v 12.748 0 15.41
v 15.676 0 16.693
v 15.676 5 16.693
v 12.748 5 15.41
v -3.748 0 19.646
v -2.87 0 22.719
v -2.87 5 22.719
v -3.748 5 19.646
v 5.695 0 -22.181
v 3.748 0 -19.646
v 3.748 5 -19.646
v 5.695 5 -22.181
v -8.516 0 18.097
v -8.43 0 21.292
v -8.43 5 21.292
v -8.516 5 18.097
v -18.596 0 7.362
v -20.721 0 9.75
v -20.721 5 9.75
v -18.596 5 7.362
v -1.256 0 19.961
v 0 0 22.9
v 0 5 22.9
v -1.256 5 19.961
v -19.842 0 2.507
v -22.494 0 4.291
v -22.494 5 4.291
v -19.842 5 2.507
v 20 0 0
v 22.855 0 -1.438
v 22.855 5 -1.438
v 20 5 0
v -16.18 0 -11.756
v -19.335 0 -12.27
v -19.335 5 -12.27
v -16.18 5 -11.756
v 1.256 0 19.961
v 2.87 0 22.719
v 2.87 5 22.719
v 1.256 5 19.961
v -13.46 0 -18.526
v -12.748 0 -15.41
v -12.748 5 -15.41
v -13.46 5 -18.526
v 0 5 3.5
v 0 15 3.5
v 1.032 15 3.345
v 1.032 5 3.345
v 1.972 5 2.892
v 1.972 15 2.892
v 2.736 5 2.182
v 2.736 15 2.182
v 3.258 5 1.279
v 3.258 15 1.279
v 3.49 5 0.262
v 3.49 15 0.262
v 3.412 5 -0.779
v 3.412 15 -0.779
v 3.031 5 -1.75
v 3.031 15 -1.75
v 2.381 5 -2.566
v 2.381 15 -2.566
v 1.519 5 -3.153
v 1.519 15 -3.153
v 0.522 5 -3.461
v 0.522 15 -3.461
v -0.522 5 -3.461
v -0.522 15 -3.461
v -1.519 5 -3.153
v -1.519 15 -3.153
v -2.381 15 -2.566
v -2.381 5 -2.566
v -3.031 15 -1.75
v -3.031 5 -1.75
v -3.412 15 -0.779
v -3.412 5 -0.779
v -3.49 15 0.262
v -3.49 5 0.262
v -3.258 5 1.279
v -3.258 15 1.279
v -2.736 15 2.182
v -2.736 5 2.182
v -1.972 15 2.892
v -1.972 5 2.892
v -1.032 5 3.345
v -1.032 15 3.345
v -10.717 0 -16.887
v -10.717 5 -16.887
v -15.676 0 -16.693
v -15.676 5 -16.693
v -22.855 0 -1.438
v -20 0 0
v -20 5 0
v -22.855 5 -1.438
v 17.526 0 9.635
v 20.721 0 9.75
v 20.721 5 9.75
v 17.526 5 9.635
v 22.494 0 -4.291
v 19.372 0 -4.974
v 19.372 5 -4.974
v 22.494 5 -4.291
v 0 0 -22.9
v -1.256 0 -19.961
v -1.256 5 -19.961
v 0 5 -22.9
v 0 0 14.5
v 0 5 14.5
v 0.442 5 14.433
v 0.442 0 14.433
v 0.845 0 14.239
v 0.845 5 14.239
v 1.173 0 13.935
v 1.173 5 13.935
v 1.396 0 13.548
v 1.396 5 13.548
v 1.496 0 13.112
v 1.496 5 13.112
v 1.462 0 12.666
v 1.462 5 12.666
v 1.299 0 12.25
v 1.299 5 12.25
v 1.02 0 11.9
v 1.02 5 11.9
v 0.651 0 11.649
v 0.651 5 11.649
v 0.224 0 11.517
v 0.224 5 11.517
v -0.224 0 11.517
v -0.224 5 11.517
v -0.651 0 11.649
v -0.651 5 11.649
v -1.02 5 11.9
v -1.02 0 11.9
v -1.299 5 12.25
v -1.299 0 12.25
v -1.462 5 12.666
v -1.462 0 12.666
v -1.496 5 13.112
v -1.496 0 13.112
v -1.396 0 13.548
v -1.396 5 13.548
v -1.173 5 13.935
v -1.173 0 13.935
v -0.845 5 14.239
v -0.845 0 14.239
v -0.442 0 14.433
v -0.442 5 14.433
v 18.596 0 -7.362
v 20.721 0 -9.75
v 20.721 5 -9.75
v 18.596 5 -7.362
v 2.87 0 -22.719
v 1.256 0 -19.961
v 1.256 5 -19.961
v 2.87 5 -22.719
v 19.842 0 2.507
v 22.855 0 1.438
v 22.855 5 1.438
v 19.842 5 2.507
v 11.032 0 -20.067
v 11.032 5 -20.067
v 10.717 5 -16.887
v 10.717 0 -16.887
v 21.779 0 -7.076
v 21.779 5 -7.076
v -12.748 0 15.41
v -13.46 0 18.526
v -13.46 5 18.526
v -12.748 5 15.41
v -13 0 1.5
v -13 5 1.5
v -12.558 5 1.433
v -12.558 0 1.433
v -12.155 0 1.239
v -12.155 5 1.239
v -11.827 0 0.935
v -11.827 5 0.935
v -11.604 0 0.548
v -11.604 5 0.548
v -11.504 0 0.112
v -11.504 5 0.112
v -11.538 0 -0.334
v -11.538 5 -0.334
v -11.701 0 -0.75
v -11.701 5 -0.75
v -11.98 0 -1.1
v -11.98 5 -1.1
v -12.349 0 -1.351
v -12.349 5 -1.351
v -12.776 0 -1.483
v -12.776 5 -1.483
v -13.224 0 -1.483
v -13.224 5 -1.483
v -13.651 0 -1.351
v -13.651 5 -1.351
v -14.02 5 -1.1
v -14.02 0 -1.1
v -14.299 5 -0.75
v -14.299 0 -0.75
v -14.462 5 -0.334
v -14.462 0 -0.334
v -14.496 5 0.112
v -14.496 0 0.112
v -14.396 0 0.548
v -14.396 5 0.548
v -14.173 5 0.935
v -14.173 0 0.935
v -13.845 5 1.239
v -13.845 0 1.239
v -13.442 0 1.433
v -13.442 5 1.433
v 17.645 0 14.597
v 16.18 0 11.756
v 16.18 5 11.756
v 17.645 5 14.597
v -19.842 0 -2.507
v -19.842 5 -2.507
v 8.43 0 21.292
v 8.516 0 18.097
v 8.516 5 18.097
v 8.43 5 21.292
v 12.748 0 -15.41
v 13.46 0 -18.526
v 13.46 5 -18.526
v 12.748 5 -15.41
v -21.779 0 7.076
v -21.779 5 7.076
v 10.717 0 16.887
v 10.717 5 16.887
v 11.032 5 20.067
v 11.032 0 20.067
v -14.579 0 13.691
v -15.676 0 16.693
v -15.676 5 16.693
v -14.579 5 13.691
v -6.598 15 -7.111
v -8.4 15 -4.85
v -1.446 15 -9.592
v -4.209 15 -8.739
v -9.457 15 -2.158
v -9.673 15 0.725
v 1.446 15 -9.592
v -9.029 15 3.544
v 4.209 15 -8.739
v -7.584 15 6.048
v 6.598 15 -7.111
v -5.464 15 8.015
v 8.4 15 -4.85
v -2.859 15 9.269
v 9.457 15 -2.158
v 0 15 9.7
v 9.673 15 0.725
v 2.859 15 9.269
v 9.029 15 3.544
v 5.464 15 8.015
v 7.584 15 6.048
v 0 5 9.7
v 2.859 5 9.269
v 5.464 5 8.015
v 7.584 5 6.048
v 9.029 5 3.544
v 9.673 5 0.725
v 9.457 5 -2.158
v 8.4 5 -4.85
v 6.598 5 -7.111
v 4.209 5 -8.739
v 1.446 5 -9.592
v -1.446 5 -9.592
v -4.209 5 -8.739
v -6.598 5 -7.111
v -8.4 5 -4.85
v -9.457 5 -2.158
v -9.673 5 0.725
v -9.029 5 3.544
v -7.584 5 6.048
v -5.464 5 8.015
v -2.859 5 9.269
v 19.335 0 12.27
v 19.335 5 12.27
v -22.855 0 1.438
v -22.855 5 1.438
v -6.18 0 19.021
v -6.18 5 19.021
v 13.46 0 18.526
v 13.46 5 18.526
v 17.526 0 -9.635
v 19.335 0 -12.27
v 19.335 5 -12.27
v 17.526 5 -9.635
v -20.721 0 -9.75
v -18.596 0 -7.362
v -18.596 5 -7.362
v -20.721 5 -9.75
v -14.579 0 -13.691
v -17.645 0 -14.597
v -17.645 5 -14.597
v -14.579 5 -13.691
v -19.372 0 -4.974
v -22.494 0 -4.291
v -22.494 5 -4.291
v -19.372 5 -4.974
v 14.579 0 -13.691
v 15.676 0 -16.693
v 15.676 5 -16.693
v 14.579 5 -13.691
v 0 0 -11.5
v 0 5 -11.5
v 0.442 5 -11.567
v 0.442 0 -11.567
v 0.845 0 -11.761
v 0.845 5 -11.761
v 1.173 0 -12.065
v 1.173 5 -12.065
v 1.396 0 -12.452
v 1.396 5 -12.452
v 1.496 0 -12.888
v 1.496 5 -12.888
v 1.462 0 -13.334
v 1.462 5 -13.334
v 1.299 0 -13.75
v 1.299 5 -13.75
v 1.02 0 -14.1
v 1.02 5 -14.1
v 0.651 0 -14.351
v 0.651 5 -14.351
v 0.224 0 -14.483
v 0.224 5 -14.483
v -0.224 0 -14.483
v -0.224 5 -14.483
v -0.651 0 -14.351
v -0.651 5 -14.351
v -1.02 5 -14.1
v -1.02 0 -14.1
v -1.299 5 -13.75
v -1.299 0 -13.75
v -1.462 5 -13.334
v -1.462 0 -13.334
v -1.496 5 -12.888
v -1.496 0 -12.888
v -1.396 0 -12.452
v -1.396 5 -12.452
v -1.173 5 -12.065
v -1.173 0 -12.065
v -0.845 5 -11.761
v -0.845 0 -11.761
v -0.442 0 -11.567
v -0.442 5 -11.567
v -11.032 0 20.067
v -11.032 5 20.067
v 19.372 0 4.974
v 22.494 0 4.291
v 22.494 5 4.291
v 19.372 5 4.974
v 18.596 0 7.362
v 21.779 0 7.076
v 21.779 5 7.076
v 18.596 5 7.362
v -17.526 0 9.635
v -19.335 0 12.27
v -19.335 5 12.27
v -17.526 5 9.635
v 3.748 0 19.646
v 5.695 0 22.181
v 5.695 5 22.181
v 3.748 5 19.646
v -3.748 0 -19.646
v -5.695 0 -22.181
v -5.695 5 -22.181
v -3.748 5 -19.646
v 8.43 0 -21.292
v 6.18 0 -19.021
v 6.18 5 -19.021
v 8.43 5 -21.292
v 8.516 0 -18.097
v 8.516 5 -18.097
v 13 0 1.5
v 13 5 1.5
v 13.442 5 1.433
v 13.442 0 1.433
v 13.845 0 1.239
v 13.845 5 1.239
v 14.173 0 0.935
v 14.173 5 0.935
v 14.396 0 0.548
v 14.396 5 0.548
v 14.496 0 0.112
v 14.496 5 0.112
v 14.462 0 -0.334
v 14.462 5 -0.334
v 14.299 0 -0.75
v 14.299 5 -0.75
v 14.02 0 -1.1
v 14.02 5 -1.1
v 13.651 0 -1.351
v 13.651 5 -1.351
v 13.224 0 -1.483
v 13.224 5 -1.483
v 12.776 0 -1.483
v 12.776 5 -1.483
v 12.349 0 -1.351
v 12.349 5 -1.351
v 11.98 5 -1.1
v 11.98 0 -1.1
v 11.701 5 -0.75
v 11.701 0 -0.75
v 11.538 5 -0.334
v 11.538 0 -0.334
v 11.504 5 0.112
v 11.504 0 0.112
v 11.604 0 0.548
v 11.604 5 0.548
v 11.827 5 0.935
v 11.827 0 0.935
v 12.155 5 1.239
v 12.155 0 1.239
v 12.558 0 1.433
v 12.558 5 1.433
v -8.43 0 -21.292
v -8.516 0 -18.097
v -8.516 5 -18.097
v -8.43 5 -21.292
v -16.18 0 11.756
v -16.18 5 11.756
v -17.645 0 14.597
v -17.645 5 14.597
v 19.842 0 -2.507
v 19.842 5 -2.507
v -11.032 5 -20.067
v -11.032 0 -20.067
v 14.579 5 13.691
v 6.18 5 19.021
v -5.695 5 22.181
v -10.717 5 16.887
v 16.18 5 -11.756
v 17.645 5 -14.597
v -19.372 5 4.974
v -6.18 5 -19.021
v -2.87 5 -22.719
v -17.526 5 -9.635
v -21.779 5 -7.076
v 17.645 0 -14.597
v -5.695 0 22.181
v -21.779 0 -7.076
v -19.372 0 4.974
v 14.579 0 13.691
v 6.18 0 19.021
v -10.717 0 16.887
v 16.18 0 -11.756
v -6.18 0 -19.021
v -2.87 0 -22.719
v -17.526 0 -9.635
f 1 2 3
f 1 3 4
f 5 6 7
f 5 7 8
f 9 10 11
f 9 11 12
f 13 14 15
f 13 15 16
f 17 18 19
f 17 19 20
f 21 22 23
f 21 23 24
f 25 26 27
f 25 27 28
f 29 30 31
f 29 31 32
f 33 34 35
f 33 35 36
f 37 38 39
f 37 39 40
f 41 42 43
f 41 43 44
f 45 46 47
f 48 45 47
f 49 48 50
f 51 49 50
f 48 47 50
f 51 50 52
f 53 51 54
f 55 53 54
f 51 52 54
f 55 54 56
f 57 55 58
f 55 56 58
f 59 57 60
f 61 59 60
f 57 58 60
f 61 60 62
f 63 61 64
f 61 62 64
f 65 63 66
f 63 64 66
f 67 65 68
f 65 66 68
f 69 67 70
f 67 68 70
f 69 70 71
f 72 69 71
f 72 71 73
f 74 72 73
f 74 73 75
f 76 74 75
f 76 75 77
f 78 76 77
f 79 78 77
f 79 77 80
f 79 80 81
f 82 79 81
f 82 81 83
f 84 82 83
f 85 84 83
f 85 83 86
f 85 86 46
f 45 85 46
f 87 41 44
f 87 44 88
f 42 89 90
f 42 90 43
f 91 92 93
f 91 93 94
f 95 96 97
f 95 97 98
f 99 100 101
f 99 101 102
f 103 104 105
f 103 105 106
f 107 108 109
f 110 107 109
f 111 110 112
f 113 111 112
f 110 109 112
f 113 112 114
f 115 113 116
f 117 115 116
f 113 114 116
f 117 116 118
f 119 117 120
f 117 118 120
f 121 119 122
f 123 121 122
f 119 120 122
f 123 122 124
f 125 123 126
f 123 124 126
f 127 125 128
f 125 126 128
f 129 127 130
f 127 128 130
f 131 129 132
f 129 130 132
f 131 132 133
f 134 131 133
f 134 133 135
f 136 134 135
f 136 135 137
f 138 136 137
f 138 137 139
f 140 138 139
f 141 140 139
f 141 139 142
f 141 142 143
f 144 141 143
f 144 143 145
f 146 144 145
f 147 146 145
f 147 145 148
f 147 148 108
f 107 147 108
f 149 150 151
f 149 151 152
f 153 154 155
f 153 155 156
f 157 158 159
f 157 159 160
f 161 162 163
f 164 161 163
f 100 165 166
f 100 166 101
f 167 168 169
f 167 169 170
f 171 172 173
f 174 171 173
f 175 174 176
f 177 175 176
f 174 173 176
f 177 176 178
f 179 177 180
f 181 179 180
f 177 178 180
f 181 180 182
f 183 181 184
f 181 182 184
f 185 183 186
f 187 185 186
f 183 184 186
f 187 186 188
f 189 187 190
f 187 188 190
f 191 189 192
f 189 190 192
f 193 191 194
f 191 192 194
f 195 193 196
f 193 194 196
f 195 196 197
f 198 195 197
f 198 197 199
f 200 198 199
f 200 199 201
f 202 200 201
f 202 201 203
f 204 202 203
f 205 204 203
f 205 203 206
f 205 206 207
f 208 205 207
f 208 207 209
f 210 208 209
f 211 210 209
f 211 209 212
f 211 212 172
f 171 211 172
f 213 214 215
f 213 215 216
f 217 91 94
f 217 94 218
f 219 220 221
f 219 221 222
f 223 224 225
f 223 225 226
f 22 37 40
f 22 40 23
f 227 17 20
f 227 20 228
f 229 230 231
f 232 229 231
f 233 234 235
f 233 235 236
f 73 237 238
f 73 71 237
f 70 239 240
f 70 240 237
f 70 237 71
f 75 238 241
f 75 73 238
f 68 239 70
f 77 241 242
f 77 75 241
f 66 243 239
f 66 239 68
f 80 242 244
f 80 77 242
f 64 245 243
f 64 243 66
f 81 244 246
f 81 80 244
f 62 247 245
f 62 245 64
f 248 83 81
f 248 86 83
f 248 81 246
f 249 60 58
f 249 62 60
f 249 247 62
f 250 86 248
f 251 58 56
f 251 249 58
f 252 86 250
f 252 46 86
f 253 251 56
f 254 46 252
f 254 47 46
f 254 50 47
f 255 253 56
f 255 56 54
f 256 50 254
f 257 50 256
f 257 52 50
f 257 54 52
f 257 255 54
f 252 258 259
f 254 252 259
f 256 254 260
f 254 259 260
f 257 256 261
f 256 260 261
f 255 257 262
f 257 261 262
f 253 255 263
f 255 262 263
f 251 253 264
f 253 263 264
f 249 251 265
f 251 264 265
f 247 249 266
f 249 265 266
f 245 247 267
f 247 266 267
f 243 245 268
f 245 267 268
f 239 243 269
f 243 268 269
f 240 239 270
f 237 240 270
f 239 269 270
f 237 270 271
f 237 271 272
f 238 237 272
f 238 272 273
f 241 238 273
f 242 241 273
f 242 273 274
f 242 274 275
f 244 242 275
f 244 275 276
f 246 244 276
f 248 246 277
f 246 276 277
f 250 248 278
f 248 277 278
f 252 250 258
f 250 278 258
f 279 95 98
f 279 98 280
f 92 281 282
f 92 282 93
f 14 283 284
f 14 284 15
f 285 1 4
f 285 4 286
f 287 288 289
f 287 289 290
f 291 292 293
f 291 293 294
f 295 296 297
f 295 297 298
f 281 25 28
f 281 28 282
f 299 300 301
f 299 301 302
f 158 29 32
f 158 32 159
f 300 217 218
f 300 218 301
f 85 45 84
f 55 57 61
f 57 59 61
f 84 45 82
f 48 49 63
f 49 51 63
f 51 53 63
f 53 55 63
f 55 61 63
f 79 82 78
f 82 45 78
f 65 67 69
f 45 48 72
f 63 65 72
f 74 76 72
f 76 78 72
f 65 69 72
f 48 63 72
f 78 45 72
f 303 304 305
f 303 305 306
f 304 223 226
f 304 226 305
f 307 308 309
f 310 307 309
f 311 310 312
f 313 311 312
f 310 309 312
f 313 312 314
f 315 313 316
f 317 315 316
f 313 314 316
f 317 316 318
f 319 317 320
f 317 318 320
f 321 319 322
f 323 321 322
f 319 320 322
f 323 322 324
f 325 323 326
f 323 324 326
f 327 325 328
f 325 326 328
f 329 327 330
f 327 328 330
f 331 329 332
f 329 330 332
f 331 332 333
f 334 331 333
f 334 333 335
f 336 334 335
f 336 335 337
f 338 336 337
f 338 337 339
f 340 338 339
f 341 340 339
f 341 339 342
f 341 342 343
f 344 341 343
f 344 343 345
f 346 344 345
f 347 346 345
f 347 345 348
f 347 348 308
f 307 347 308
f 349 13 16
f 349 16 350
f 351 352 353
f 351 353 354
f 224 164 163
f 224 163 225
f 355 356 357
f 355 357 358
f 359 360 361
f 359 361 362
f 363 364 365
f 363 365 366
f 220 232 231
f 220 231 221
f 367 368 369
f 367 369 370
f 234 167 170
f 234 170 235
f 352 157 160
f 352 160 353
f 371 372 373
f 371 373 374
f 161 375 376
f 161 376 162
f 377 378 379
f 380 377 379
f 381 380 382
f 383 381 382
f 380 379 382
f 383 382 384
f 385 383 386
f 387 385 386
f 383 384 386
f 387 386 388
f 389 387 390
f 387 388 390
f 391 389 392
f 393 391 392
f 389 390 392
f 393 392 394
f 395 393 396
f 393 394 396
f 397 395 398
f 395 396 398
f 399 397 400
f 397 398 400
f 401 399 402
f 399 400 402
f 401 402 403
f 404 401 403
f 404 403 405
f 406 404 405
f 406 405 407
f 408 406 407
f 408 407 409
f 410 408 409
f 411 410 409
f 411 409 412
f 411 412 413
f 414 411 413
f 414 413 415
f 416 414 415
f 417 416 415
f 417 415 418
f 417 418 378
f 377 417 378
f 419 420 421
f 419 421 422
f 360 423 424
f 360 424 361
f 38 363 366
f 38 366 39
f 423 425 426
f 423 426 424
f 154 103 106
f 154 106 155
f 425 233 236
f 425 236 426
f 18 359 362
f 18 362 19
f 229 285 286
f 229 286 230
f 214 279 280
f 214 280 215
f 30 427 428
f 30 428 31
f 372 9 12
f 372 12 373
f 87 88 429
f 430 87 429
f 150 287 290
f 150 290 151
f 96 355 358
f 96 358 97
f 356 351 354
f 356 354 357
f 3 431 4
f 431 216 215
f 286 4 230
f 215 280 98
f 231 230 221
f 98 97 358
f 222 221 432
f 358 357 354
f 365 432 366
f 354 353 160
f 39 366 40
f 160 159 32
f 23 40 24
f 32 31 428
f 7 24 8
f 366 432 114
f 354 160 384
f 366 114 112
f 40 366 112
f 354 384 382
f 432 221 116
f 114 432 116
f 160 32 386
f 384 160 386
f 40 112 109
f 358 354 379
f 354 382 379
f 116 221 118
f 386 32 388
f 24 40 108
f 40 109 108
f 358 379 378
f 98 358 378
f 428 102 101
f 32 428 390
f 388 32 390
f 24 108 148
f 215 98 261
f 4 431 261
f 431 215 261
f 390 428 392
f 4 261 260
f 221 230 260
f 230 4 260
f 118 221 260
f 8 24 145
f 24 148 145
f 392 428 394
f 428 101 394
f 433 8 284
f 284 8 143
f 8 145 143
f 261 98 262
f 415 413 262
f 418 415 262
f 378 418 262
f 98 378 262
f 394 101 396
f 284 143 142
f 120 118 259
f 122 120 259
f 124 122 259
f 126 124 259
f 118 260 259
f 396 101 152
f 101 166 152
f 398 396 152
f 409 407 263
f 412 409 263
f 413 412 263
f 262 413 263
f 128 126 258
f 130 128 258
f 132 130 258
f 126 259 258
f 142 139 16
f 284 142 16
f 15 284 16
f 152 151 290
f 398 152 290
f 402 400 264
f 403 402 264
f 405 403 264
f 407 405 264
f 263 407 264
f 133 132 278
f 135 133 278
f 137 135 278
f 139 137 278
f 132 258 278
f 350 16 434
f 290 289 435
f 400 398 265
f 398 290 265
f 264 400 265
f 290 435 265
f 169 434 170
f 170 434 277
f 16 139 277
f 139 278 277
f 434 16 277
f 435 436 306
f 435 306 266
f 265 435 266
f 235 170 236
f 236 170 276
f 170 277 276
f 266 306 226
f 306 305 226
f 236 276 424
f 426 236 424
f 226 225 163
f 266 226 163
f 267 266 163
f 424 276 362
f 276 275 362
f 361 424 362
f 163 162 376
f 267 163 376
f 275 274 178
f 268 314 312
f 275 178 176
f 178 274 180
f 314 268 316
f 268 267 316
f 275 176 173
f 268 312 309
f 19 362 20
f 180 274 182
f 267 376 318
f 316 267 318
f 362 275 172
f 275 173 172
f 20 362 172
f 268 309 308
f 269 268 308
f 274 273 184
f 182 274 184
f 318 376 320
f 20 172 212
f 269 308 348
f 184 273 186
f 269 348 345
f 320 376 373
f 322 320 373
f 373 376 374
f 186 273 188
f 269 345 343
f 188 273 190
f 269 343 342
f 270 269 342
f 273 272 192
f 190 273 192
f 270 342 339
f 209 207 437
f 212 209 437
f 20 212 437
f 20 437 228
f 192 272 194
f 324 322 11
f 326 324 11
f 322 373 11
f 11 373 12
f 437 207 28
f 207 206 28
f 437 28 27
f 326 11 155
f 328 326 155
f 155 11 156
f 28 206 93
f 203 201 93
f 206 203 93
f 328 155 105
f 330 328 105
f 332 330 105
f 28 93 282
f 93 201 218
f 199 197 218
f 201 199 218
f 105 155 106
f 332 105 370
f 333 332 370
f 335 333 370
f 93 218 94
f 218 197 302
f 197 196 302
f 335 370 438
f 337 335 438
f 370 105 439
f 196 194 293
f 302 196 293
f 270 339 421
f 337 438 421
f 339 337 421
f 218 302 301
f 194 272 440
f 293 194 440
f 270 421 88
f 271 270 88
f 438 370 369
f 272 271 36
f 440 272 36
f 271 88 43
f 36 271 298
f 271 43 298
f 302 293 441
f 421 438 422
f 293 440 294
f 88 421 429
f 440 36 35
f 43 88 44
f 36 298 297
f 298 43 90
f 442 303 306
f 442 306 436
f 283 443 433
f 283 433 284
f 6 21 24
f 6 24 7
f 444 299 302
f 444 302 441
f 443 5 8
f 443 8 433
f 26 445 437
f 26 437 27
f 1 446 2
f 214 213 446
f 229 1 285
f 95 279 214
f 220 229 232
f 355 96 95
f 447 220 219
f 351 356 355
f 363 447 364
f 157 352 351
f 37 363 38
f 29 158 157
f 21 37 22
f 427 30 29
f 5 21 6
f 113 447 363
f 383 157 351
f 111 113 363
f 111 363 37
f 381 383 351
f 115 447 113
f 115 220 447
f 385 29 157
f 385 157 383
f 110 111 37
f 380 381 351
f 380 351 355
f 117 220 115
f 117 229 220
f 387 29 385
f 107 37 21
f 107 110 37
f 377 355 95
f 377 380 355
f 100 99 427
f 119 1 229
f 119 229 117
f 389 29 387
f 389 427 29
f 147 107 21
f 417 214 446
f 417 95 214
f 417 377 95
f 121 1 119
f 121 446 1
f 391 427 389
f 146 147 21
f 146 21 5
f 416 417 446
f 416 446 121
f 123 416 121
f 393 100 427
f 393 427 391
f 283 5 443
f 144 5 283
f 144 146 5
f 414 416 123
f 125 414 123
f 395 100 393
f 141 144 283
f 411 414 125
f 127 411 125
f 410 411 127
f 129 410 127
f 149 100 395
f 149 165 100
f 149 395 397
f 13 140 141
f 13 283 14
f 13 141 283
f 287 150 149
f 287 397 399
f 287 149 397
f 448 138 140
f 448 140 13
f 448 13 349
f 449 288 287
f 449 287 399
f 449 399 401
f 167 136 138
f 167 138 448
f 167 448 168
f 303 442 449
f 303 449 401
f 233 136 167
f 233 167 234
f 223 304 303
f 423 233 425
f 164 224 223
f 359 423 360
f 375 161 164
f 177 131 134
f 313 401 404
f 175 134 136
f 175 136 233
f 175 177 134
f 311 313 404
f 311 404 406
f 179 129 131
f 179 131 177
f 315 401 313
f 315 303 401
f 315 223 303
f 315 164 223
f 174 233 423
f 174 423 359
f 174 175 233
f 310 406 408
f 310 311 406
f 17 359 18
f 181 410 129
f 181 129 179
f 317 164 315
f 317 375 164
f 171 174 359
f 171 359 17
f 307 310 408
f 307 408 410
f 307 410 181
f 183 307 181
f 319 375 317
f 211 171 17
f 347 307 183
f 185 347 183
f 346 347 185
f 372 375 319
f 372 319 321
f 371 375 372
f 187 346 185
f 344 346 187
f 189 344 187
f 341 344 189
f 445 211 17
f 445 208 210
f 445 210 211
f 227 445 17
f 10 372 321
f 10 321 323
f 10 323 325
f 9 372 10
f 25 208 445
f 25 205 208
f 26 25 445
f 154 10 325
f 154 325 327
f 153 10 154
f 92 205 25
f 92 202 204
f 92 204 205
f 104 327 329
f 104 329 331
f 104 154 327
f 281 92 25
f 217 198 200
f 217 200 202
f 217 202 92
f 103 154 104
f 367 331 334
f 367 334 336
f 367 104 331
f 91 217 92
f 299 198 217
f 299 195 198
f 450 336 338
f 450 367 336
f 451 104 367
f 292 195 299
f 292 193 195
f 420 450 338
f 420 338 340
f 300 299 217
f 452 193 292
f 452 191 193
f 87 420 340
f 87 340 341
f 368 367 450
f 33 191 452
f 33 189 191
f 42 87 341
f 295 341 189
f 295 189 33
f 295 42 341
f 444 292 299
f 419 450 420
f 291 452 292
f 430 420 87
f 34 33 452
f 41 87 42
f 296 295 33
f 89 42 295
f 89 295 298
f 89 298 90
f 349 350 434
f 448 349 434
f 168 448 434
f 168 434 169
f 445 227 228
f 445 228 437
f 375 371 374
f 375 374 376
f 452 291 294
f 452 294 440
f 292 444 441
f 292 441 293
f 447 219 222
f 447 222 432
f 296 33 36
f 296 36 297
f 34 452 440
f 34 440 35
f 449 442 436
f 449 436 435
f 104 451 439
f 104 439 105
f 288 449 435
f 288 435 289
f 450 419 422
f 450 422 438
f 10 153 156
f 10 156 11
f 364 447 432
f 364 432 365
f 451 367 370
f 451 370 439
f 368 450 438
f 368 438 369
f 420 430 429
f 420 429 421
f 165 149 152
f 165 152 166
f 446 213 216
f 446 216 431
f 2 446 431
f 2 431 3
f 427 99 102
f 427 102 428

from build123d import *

# Parameters (mm, degrees)
SKETCH_1_R          = 20
EXTRUDE_1_DEPTH     = 5
SKETCH_2_R          = 9.7
EXTRUDE_2_DEPTH     = 10
SKETCH_3_R          = 3.5
CUT_EXTRUDE_1_DEPTH = 15
SKETCH_6_R          = 1.5
CUT_EXTRUDE_2_DEPTH = 15
EXTRUDE_3_DEPTH     = 5
SKETCH_13_R         = 1.5
CUT_EXTRUDE_3_DEPTH = 36.661638146


with BuildPart() as part:
    # 草图1 → 凸台-拉伸1 (new body)
    with BuildSketch(Plane(origin=(0, 0, 0), x_dir=(1, 0, 0), z_dir=(0, 1, 0))):
        with Locations(Location((0, 0, 0), (0, 0, 270))):
            Circle(SKETCH_1_R)
    extrude(amount=EXTRUDE_1_DEPTH)

    # 草图2 → 凸台-拉伸2 (add)
    with BuildSketch(Plane(origin=(0, 5, 0), x_dir=(1, 0, 0), z_dir=(0, 1, 0))):
        with Locations(Location((0, 0, 0), (0, 0, 270))):
            Circle(SKETCH_2_R)
    extrude(amount=EXTRUDE_2_DEPTH)

    # 草图3 → 切除-拉伸1 (cut)
    with BuildSketch(Plane(origin=(0, 15, 0), x_dir=(1, 0, 0), z_dir=(0, 1, 0))):
        with Locations(Location((0, 0, 0), (0, 0, 270))):
            Circle(SKETCH_3_R)
    extrude(amount=-CUT_EXTRUDE_1_DEPTH, mode=Mode.SUBTRACT)

    # 草图6 → 切除-拉伸2 (cut)
    with BuildSketch(Plane(origin=(0, 5, 0), x_dir=(1, 0, 0), z_dir=(0, 1, 0))):
        with Locations(Location((-13, 0, 0), (0, 0, 270))):
            Circle(SKETCH_6_R)
        with Locations(Location((0, 13, 0), (0, 0, 270))):
            Circle(SKETCH_6_R)
        with Locations(Location((13, 0, 0), (0, 0, 270))):
            Circle(SKETCH_6_R)
        with Locations(Location((0, -13, 0), (0, 0, 270))):
            Circle(SKETCH_6_R)
    extrude(amount=-CUT_EXTRUDE_2_DEPTH, mode=Mode.SUBTRACT)

    # 草图12 → 凸台-拉伸3 (add)
    with BuildSketch(Plane(origin=(0, 0, 0), x_dir=(1, 0, 0), z_dir=(0, 1, 0))):
        Polygon((-1.255810391, 19.960534569), (0, 22.9), (1.255810391, 19.960534569), (2.870131049, 22.71942666), (3.747626292, 19.645745015), (5.694998416, 22.18055439), (6.180339887, 19.021130326), (8.430052256, 21.291881527), (8.515585831, 18.096541049), (11.032159137, 20.067422973), (10.7165359, 16.88655851), (13.460282277, 18.526489171), (12.748479795, 15.410264856), (15.676128726, 16.693381568), (14.579372548, 13.690942119), (17.64475326, 14.597009365), (16.180339887, 11.755705046), (19.335109494, 12.270433605), (17.526133601, 9.635073482), (20.720539501, 9.750345777), (18.595529718, 7.362491054), (21.779194223, 7.076489171), (19.371663223, 4.973797743), (22.494378042, 4.291032104), (19.842294026, 2.506664671), (22.854812081, 1.437902897), (20, 0), (22.854812081, -1.437902897), (19.842294026, -2.506664671), (22.494378042, -4.291032104), (19.371663223, -4.973797743), (21.779194223, -7.076489171), (18.595529718, -7.362491054), (20.720539501, -9.750345777), (17.526133601, -9.635073482), (19.335109494, -12.270433605), (16.180339887, -11.755705046), (17.64475326, -14.597009365), (14.579372548, -13.690942119), (15.676128726, -16.693381568), (12.748479795, -15.410264856), (13.460282277, -18.526489171), (10.7165359, -16.88655851), (11.032159137, -20.067422973), (8.515585831, -18.096541049), (8.430052256, -21.291881527), (6.180339887, -19.021130326), (5.694998416, -22.18055439), (3.747626292, -19.645745015), (2.870131049, -22.71942666), (1.255810391, -19.960534569), (0, -22.9), (-1.255810391, -19.960534569), (-2.870131049, -22.71942666), (-3.747626292, -19.645745015), (-5.694998416, -22.18055439), (-6.180339887, -19.021130326), (-8.430052256, -21.291881527), (-8.515585831, -18.096541049), (-11.032159137, -20.067422973), (-10.7165359, -16.88655851), (-13.460282277, -18.526489171), (-12.748479795, -15.410264856), (-15.676128726, -16.693381568), (-14.579372548, -13.690942119), (-17.64475326, -14.597009365), (-16.180339887, -11.755705046), (-19.335109494, -12.270433605), (-17.526133601, -9.635073482), (-20.720539501, -9.750345777), (-18.595529718, -7.362491054), (-21.779194223, -7.076489171), (-19.371663223, -4.973797743), (-22.494378042, -4.291032104), (-19.842294026, -2.506664671), (-22.854812081, -1.437902897), (-20, 0), (-22.854812081, 1.437902897), (-19.842294026, 2.506664671), (-22.494378042, 4.291032104), (-19.371663223, 4.973797743), (-21.779194223, 7.076489171), (-18.595529718, 7.362491054), (-20.720539501, 9.750345777), (-17.526133601, 9.635073482), (-19.335109494, 12.270433605), (-16.180339887, 11.755705046), (-17.64475326, 14.597009365), (-14.579372548, 13.690942119), (-15.676128726, 16.693381568), (-12.748479795, 15.410264856), (-13.460282277, 18.526489171), (-10.7165359, 16.88655851), (-11.032159137, 20.067422973), (-8.515585831, 18.096541049), (-8.430052256, 21.291881527), (-6.180339887, 19.021130326), (-5.694998416, 22.18055439), (-3.747626292, 19.645745015), (-2.870131049, 22.71942666), align=None)
    extrude(amount=EXTRUDE_3_DEPTH)

    # 草图13 → 切除-拉伸3 (cut, through all)
    with BuildSketch(Plane(origin=(0, 15, 0), x_dir=(1, 0, 0), z_dir=(0, 1, 0))):
        with Locations(Location((0, 13, 0), (0, 0, 270))):
            Circle(SKETCH_13_R)
        with Locations(Location((13, 0, 0), (0, 0, 270))):
            Circle(SKETCH_13_R)
        with Locations(Location((0, -13, 0), (0, 0, 270))):
            Circle(SKETCH_13_R)
        with Locations(Location((-13, 0, 0), (0, 0, 270))):
            Circle(SKETCH_13_R)
    extrude(amount=-CUT_EXTRUDE_3_DEPTH, mode=Mode.SUBTRACT)


solid = part.part
